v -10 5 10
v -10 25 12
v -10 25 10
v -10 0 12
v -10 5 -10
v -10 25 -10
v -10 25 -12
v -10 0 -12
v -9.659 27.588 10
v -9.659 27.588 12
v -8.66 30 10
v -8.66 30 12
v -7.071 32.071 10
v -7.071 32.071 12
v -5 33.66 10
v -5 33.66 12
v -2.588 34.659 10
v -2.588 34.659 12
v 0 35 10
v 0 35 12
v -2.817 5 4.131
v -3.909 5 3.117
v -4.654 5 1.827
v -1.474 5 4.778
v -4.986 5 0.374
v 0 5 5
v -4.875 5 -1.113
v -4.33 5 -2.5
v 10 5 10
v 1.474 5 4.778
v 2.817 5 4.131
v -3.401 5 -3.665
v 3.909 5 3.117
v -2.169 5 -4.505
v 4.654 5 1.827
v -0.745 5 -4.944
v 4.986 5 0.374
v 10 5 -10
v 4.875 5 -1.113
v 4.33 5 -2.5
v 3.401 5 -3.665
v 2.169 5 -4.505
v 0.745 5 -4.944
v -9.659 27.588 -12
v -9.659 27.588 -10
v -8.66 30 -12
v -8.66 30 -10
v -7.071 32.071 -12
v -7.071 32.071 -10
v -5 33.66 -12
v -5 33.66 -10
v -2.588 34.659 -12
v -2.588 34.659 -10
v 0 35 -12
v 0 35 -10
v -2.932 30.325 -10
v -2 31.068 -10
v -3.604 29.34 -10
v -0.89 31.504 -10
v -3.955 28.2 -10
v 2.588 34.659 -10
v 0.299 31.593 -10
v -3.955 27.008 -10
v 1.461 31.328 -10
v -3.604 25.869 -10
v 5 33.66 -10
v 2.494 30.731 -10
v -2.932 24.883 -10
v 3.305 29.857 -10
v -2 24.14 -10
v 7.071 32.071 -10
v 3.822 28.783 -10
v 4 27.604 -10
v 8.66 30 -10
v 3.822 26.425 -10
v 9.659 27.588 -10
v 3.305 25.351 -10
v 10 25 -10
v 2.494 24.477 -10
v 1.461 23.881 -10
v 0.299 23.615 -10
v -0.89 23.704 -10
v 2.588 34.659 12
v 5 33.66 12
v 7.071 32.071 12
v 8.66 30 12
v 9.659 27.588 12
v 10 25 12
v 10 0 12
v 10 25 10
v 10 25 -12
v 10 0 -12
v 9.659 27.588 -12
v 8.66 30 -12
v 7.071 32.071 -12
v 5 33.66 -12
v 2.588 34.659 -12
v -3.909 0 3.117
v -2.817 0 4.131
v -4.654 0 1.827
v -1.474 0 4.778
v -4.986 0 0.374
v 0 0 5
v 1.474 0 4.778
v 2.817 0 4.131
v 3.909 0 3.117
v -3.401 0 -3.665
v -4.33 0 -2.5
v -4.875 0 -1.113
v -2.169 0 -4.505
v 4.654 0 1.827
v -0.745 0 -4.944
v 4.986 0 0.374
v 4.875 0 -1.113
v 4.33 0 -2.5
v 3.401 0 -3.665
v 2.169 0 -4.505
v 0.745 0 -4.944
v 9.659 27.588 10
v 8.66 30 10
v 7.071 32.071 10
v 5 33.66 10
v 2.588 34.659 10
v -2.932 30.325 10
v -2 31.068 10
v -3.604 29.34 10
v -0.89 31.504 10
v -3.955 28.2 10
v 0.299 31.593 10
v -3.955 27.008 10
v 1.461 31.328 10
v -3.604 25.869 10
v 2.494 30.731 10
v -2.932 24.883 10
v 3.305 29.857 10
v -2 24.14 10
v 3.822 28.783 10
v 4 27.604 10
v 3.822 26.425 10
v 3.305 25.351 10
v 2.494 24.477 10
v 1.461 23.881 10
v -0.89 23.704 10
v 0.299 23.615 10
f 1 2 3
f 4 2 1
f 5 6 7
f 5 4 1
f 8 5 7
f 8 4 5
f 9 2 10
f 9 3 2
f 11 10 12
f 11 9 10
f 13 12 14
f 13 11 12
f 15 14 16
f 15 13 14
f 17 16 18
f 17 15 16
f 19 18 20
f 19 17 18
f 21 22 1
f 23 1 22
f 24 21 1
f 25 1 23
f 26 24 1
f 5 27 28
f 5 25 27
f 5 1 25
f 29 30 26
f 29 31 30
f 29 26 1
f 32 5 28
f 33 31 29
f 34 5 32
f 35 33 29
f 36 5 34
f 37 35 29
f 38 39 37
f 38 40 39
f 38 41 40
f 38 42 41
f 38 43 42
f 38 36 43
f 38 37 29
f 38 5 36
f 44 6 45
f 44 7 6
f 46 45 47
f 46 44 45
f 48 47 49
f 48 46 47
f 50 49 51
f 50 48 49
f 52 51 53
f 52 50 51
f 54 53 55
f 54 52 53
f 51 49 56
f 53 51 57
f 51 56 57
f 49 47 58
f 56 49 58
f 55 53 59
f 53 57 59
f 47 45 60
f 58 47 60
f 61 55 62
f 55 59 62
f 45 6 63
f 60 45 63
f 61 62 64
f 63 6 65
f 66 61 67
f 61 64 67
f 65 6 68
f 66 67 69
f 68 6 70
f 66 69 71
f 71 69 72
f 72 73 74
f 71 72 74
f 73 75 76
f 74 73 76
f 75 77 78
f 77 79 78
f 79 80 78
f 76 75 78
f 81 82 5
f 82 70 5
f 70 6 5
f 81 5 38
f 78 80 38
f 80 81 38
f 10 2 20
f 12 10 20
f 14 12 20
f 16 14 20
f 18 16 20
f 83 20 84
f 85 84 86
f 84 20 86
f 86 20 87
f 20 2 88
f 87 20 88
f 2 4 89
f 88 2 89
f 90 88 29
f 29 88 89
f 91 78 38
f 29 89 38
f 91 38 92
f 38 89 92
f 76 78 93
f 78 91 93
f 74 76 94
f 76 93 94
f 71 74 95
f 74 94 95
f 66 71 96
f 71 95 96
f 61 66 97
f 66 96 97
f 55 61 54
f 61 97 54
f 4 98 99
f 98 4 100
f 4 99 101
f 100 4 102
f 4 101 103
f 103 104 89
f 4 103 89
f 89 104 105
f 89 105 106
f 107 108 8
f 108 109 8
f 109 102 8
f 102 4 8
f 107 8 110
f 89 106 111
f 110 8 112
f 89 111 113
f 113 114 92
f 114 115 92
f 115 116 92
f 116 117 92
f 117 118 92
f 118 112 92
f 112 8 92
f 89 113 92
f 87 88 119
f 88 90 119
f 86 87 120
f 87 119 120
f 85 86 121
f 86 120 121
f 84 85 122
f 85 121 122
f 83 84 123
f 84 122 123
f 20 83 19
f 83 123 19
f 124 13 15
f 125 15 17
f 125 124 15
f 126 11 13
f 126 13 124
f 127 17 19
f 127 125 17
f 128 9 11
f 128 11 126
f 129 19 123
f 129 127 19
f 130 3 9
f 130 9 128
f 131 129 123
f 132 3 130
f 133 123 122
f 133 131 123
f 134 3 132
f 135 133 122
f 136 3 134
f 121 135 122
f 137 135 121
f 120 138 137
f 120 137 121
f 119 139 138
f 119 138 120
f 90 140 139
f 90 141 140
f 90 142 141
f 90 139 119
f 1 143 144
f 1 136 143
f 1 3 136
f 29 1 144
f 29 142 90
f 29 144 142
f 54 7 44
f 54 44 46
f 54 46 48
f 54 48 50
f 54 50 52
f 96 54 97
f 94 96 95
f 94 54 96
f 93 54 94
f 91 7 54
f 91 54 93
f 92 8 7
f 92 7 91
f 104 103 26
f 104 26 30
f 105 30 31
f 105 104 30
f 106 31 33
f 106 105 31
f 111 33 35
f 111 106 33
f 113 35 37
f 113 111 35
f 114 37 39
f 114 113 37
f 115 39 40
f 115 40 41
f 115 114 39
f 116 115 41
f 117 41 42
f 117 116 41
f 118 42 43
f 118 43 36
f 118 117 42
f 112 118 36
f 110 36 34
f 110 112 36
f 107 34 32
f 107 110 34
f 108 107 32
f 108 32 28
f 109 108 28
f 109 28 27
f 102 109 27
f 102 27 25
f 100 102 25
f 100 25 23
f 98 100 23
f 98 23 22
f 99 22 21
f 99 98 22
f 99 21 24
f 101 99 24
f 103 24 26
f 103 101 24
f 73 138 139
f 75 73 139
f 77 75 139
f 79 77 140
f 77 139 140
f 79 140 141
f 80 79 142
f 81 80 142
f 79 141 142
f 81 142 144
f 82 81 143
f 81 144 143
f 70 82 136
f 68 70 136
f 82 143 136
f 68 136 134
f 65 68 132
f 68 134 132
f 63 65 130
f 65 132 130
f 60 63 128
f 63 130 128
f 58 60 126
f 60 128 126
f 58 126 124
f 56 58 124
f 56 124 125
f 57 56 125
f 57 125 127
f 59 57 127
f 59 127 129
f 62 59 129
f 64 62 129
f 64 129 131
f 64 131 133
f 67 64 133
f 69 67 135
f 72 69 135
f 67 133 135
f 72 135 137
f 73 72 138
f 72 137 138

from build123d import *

# Parameters (mm, degrees)
SKETCH1_W                = 20
SKETCH1_H                = 20
SKETCH1_R                = 5
BOSS_EXTRUDE1_DEPTH      = 5
BOSS_EXTRUDE2_DEPTH      = 30
BOSS_EXTRUDE2_DEPTH_BACK = 5
SKETCH2_W                = 20
SKETCH2_H                = 2
FILLET1_R                = 10
SKETCH4_R                = 4
BOSS_EXTRUDE4_DEPTH      = 20


with BuildPart() as part:
    # Sketch1 → Boss-Extrude1 (new body)
    with BuildSketch(Plane(origin=(0, 0, 0), x_dir=(1, 0, 0), z_dir=(0, 1, 0))):
        Rectangle(SKETCH1_W, SKETCH1_H)
        with Locations(Location((0, 0, 0), (0, 0, 270))):
            Circle(SKETCH1_R, mode=Mode.SUBTRACT)
    extrude(amount=BOSS_EXTRUDE1_DEPTH)

    # Sketch2 → Boss-Extrude2 (add, two sides: drawn at the far end of the back side and taken through both)
    with BuildSketch(Plane(origin=(0, 5, 0), x_dir=(1, 0, 0), z_dir=(0, 1, 0)).offset(-BOSS_EXTRUDE2_DEPTH_BACK)):
        with Locations((0, -11)):
            Rectangle(SKETCH2_W, SKETCH2_H)
        with Locations((0, 11)):
            Rectangle(SKETCH2_W, SKETCH2_H)
    extrude(amount=BOSS_EXTRUDE2_DEPTH + BOSS_EXTRUDE2_DEPTH_BACK)

    # Fillet1
    fillet1_edges = [part.edges().sort_by_distance(p)[0] for p in [
        (10, 35, -11),
        (10, 35, 11),
        (-10, 35, 11),
        (-10, 35, -11),
    ]]
    fillet(fillet1_edges, radius=FILLET1_R - 0.0001)  # a hair under: the kernel refuses the full size

    # Sketch4 → Boss-Extrude4 (add)
    with BuildSketch(Plane(origin=(0, 0, 10), x_dir=(-1, 0, 0), z_dir=(0, 0, -1))):
        with Locations(Location((0, 27.604071929, 0), (0, 0, 180))):
            Circle(SKETCH4_R)
    extrude(amount=BOSS_EXTRUDE4_DEPTH)


solid = part.part
